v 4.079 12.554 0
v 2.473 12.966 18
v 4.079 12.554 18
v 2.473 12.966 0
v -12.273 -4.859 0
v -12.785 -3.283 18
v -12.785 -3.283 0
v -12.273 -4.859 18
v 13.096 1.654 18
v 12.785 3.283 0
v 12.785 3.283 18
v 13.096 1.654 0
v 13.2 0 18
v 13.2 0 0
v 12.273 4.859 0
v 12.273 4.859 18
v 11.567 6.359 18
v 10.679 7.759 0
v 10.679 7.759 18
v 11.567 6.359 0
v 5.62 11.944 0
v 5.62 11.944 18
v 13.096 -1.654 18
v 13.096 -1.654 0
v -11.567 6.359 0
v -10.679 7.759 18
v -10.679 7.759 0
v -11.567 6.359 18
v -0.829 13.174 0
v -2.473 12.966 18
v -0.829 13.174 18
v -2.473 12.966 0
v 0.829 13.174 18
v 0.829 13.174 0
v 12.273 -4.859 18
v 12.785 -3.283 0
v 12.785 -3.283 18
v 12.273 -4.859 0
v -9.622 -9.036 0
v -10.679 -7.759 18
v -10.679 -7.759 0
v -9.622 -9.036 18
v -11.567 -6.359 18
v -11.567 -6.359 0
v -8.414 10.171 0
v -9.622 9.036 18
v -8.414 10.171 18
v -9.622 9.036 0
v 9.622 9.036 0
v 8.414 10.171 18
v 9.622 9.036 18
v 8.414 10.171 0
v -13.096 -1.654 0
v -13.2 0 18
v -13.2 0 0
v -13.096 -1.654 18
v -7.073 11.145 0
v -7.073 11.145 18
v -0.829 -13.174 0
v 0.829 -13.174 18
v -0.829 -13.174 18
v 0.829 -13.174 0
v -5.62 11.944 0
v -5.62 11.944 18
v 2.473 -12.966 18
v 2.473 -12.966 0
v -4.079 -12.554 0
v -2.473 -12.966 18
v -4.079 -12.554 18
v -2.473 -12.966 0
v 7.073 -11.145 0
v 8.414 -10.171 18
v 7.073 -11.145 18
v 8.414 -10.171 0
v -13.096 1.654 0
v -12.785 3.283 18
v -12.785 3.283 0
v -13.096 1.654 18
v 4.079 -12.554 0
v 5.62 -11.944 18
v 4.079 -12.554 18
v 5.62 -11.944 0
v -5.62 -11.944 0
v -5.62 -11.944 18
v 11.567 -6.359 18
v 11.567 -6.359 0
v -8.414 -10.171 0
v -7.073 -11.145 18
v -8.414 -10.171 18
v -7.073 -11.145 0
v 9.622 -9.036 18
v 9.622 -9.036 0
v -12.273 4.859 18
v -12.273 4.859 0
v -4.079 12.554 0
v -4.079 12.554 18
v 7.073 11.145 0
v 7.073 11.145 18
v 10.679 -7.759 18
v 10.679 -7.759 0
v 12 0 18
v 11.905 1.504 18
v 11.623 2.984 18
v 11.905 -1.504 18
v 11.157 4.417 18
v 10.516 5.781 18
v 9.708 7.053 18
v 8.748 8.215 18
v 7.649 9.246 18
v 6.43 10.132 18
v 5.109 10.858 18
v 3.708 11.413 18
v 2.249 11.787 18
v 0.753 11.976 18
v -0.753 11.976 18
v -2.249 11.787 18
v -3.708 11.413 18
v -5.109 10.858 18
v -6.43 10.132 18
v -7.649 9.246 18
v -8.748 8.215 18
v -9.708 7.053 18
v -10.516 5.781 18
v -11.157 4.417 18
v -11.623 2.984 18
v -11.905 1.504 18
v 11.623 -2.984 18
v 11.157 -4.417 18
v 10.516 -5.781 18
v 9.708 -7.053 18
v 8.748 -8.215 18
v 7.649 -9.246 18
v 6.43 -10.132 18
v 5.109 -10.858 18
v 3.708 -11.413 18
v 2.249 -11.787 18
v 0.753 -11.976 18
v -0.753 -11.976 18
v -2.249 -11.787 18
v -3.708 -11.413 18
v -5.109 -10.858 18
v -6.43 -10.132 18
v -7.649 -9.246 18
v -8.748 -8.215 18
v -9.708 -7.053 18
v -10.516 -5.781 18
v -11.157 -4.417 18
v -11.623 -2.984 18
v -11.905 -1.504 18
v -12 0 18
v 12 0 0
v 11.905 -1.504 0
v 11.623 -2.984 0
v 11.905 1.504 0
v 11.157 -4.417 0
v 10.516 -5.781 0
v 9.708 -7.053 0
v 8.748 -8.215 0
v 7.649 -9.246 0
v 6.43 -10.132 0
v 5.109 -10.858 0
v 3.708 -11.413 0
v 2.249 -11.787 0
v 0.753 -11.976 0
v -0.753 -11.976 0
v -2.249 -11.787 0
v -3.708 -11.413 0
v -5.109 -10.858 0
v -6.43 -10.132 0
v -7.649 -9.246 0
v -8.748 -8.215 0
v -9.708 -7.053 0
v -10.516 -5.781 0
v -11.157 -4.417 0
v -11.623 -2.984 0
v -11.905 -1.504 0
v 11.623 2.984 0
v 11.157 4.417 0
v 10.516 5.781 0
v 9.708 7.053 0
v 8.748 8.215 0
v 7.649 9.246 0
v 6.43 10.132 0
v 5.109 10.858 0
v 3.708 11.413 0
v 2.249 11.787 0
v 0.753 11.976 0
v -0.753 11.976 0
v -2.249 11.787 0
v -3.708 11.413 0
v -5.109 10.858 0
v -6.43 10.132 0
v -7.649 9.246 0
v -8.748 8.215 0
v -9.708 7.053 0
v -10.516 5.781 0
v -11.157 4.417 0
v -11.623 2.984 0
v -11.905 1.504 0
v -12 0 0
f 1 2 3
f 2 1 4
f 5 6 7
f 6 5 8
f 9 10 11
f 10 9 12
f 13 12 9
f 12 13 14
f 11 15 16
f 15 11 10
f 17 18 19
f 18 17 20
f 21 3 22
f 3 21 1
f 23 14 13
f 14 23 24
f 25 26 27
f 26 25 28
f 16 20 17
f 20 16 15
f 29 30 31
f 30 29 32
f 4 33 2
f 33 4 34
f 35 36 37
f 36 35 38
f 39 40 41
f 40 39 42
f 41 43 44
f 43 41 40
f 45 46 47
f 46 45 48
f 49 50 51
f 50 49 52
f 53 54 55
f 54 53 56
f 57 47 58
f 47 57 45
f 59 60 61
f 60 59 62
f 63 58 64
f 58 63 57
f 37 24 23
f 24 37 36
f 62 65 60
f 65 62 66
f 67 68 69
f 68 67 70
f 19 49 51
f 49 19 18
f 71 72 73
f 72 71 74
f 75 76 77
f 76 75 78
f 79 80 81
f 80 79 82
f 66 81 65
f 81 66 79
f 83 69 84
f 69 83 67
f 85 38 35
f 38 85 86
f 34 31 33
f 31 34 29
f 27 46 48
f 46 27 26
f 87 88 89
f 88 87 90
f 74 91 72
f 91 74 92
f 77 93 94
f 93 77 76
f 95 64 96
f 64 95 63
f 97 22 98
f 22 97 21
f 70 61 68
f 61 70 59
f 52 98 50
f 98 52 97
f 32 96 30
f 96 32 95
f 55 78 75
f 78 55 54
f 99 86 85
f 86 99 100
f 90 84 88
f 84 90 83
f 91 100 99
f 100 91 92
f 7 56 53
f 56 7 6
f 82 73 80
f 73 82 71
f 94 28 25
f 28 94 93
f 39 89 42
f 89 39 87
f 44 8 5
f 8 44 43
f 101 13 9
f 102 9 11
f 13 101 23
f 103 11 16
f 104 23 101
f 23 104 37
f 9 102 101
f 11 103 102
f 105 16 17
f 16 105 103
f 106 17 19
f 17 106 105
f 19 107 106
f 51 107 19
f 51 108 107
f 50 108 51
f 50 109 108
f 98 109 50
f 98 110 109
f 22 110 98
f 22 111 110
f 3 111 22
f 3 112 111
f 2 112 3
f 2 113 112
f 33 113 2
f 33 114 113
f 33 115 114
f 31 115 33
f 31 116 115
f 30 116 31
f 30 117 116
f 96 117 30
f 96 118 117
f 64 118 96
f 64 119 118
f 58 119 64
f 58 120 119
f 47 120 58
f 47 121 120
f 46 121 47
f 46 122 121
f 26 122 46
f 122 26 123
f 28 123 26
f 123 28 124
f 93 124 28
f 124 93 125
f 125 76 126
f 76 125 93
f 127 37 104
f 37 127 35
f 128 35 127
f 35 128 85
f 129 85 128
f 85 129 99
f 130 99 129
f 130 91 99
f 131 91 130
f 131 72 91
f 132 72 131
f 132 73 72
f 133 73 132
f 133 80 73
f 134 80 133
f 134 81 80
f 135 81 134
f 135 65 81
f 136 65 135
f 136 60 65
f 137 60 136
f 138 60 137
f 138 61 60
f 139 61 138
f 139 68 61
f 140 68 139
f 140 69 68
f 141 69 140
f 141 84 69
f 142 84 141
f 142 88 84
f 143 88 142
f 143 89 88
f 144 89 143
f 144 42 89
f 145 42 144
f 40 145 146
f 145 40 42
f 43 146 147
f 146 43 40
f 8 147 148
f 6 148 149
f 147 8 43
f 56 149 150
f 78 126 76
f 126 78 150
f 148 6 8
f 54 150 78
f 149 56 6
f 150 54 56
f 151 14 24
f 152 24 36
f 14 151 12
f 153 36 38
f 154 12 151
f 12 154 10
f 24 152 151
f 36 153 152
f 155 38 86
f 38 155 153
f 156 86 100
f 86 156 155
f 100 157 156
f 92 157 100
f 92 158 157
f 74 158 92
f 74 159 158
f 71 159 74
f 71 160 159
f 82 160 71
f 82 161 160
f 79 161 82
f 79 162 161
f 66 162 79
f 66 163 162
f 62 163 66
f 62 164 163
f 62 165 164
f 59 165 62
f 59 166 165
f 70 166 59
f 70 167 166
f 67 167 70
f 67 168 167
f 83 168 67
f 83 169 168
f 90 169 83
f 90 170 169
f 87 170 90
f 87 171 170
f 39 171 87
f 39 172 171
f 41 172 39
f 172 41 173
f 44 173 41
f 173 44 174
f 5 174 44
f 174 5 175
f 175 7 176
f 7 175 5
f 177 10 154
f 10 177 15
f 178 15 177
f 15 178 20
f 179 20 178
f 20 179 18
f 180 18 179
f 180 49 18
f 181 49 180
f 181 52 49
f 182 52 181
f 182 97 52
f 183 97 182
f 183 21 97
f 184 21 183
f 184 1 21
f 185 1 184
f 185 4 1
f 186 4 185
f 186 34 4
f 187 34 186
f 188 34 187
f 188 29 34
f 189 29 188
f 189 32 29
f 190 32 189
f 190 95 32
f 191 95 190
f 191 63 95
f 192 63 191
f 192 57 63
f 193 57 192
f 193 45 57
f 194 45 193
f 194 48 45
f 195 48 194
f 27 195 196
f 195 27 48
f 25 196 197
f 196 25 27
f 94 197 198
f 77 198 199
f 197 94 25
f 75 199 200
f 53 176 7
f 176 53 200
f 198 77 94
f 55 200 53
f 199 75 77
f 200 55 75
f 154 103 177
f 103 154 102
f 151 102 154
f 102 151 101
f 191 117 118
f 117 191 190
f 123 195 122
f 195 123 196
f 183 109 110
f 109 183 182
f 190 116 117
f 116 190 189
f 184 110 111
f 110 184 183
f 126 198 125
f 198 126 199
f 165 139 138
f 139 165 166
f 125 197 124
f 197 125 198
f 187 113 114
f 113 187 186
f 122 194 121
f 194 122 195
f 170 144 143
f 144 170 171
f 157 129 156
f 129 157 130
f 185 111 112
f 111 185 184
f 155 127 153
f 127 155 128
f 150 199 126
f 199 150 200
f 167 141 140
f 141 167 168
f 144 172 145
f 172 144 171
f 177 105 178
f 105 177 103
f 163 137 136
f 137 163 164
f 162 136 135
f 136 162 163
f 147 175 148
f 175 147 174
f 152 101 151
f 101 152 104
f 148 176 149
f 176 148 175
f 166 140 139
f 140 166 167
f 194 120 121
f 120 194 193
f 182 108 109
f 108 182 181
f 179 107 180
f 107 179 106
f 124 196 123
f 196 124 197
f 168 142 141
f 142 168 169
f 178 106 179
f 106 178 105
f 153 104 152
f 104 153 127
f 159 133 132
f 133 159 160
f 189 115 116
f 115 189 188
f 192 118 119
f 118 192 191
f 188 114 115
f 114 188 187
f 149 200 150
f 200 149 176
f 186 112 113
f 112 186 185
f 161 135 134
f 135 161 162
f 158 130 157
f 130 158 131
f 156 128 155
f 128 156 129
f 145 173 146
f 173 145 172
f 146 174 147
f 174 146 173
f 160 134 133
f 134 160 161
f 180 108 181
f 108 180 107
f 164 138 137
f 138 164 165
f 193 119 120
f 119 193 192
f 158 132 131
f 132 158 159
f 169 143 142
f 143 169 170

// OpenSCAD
$fn = 50;

difference() {
	union() {
		difference() {
			cylinder(h = 18, r = 13.2);
			cylinder(h = 18, r = 12);
		}
	}
	union();
}
